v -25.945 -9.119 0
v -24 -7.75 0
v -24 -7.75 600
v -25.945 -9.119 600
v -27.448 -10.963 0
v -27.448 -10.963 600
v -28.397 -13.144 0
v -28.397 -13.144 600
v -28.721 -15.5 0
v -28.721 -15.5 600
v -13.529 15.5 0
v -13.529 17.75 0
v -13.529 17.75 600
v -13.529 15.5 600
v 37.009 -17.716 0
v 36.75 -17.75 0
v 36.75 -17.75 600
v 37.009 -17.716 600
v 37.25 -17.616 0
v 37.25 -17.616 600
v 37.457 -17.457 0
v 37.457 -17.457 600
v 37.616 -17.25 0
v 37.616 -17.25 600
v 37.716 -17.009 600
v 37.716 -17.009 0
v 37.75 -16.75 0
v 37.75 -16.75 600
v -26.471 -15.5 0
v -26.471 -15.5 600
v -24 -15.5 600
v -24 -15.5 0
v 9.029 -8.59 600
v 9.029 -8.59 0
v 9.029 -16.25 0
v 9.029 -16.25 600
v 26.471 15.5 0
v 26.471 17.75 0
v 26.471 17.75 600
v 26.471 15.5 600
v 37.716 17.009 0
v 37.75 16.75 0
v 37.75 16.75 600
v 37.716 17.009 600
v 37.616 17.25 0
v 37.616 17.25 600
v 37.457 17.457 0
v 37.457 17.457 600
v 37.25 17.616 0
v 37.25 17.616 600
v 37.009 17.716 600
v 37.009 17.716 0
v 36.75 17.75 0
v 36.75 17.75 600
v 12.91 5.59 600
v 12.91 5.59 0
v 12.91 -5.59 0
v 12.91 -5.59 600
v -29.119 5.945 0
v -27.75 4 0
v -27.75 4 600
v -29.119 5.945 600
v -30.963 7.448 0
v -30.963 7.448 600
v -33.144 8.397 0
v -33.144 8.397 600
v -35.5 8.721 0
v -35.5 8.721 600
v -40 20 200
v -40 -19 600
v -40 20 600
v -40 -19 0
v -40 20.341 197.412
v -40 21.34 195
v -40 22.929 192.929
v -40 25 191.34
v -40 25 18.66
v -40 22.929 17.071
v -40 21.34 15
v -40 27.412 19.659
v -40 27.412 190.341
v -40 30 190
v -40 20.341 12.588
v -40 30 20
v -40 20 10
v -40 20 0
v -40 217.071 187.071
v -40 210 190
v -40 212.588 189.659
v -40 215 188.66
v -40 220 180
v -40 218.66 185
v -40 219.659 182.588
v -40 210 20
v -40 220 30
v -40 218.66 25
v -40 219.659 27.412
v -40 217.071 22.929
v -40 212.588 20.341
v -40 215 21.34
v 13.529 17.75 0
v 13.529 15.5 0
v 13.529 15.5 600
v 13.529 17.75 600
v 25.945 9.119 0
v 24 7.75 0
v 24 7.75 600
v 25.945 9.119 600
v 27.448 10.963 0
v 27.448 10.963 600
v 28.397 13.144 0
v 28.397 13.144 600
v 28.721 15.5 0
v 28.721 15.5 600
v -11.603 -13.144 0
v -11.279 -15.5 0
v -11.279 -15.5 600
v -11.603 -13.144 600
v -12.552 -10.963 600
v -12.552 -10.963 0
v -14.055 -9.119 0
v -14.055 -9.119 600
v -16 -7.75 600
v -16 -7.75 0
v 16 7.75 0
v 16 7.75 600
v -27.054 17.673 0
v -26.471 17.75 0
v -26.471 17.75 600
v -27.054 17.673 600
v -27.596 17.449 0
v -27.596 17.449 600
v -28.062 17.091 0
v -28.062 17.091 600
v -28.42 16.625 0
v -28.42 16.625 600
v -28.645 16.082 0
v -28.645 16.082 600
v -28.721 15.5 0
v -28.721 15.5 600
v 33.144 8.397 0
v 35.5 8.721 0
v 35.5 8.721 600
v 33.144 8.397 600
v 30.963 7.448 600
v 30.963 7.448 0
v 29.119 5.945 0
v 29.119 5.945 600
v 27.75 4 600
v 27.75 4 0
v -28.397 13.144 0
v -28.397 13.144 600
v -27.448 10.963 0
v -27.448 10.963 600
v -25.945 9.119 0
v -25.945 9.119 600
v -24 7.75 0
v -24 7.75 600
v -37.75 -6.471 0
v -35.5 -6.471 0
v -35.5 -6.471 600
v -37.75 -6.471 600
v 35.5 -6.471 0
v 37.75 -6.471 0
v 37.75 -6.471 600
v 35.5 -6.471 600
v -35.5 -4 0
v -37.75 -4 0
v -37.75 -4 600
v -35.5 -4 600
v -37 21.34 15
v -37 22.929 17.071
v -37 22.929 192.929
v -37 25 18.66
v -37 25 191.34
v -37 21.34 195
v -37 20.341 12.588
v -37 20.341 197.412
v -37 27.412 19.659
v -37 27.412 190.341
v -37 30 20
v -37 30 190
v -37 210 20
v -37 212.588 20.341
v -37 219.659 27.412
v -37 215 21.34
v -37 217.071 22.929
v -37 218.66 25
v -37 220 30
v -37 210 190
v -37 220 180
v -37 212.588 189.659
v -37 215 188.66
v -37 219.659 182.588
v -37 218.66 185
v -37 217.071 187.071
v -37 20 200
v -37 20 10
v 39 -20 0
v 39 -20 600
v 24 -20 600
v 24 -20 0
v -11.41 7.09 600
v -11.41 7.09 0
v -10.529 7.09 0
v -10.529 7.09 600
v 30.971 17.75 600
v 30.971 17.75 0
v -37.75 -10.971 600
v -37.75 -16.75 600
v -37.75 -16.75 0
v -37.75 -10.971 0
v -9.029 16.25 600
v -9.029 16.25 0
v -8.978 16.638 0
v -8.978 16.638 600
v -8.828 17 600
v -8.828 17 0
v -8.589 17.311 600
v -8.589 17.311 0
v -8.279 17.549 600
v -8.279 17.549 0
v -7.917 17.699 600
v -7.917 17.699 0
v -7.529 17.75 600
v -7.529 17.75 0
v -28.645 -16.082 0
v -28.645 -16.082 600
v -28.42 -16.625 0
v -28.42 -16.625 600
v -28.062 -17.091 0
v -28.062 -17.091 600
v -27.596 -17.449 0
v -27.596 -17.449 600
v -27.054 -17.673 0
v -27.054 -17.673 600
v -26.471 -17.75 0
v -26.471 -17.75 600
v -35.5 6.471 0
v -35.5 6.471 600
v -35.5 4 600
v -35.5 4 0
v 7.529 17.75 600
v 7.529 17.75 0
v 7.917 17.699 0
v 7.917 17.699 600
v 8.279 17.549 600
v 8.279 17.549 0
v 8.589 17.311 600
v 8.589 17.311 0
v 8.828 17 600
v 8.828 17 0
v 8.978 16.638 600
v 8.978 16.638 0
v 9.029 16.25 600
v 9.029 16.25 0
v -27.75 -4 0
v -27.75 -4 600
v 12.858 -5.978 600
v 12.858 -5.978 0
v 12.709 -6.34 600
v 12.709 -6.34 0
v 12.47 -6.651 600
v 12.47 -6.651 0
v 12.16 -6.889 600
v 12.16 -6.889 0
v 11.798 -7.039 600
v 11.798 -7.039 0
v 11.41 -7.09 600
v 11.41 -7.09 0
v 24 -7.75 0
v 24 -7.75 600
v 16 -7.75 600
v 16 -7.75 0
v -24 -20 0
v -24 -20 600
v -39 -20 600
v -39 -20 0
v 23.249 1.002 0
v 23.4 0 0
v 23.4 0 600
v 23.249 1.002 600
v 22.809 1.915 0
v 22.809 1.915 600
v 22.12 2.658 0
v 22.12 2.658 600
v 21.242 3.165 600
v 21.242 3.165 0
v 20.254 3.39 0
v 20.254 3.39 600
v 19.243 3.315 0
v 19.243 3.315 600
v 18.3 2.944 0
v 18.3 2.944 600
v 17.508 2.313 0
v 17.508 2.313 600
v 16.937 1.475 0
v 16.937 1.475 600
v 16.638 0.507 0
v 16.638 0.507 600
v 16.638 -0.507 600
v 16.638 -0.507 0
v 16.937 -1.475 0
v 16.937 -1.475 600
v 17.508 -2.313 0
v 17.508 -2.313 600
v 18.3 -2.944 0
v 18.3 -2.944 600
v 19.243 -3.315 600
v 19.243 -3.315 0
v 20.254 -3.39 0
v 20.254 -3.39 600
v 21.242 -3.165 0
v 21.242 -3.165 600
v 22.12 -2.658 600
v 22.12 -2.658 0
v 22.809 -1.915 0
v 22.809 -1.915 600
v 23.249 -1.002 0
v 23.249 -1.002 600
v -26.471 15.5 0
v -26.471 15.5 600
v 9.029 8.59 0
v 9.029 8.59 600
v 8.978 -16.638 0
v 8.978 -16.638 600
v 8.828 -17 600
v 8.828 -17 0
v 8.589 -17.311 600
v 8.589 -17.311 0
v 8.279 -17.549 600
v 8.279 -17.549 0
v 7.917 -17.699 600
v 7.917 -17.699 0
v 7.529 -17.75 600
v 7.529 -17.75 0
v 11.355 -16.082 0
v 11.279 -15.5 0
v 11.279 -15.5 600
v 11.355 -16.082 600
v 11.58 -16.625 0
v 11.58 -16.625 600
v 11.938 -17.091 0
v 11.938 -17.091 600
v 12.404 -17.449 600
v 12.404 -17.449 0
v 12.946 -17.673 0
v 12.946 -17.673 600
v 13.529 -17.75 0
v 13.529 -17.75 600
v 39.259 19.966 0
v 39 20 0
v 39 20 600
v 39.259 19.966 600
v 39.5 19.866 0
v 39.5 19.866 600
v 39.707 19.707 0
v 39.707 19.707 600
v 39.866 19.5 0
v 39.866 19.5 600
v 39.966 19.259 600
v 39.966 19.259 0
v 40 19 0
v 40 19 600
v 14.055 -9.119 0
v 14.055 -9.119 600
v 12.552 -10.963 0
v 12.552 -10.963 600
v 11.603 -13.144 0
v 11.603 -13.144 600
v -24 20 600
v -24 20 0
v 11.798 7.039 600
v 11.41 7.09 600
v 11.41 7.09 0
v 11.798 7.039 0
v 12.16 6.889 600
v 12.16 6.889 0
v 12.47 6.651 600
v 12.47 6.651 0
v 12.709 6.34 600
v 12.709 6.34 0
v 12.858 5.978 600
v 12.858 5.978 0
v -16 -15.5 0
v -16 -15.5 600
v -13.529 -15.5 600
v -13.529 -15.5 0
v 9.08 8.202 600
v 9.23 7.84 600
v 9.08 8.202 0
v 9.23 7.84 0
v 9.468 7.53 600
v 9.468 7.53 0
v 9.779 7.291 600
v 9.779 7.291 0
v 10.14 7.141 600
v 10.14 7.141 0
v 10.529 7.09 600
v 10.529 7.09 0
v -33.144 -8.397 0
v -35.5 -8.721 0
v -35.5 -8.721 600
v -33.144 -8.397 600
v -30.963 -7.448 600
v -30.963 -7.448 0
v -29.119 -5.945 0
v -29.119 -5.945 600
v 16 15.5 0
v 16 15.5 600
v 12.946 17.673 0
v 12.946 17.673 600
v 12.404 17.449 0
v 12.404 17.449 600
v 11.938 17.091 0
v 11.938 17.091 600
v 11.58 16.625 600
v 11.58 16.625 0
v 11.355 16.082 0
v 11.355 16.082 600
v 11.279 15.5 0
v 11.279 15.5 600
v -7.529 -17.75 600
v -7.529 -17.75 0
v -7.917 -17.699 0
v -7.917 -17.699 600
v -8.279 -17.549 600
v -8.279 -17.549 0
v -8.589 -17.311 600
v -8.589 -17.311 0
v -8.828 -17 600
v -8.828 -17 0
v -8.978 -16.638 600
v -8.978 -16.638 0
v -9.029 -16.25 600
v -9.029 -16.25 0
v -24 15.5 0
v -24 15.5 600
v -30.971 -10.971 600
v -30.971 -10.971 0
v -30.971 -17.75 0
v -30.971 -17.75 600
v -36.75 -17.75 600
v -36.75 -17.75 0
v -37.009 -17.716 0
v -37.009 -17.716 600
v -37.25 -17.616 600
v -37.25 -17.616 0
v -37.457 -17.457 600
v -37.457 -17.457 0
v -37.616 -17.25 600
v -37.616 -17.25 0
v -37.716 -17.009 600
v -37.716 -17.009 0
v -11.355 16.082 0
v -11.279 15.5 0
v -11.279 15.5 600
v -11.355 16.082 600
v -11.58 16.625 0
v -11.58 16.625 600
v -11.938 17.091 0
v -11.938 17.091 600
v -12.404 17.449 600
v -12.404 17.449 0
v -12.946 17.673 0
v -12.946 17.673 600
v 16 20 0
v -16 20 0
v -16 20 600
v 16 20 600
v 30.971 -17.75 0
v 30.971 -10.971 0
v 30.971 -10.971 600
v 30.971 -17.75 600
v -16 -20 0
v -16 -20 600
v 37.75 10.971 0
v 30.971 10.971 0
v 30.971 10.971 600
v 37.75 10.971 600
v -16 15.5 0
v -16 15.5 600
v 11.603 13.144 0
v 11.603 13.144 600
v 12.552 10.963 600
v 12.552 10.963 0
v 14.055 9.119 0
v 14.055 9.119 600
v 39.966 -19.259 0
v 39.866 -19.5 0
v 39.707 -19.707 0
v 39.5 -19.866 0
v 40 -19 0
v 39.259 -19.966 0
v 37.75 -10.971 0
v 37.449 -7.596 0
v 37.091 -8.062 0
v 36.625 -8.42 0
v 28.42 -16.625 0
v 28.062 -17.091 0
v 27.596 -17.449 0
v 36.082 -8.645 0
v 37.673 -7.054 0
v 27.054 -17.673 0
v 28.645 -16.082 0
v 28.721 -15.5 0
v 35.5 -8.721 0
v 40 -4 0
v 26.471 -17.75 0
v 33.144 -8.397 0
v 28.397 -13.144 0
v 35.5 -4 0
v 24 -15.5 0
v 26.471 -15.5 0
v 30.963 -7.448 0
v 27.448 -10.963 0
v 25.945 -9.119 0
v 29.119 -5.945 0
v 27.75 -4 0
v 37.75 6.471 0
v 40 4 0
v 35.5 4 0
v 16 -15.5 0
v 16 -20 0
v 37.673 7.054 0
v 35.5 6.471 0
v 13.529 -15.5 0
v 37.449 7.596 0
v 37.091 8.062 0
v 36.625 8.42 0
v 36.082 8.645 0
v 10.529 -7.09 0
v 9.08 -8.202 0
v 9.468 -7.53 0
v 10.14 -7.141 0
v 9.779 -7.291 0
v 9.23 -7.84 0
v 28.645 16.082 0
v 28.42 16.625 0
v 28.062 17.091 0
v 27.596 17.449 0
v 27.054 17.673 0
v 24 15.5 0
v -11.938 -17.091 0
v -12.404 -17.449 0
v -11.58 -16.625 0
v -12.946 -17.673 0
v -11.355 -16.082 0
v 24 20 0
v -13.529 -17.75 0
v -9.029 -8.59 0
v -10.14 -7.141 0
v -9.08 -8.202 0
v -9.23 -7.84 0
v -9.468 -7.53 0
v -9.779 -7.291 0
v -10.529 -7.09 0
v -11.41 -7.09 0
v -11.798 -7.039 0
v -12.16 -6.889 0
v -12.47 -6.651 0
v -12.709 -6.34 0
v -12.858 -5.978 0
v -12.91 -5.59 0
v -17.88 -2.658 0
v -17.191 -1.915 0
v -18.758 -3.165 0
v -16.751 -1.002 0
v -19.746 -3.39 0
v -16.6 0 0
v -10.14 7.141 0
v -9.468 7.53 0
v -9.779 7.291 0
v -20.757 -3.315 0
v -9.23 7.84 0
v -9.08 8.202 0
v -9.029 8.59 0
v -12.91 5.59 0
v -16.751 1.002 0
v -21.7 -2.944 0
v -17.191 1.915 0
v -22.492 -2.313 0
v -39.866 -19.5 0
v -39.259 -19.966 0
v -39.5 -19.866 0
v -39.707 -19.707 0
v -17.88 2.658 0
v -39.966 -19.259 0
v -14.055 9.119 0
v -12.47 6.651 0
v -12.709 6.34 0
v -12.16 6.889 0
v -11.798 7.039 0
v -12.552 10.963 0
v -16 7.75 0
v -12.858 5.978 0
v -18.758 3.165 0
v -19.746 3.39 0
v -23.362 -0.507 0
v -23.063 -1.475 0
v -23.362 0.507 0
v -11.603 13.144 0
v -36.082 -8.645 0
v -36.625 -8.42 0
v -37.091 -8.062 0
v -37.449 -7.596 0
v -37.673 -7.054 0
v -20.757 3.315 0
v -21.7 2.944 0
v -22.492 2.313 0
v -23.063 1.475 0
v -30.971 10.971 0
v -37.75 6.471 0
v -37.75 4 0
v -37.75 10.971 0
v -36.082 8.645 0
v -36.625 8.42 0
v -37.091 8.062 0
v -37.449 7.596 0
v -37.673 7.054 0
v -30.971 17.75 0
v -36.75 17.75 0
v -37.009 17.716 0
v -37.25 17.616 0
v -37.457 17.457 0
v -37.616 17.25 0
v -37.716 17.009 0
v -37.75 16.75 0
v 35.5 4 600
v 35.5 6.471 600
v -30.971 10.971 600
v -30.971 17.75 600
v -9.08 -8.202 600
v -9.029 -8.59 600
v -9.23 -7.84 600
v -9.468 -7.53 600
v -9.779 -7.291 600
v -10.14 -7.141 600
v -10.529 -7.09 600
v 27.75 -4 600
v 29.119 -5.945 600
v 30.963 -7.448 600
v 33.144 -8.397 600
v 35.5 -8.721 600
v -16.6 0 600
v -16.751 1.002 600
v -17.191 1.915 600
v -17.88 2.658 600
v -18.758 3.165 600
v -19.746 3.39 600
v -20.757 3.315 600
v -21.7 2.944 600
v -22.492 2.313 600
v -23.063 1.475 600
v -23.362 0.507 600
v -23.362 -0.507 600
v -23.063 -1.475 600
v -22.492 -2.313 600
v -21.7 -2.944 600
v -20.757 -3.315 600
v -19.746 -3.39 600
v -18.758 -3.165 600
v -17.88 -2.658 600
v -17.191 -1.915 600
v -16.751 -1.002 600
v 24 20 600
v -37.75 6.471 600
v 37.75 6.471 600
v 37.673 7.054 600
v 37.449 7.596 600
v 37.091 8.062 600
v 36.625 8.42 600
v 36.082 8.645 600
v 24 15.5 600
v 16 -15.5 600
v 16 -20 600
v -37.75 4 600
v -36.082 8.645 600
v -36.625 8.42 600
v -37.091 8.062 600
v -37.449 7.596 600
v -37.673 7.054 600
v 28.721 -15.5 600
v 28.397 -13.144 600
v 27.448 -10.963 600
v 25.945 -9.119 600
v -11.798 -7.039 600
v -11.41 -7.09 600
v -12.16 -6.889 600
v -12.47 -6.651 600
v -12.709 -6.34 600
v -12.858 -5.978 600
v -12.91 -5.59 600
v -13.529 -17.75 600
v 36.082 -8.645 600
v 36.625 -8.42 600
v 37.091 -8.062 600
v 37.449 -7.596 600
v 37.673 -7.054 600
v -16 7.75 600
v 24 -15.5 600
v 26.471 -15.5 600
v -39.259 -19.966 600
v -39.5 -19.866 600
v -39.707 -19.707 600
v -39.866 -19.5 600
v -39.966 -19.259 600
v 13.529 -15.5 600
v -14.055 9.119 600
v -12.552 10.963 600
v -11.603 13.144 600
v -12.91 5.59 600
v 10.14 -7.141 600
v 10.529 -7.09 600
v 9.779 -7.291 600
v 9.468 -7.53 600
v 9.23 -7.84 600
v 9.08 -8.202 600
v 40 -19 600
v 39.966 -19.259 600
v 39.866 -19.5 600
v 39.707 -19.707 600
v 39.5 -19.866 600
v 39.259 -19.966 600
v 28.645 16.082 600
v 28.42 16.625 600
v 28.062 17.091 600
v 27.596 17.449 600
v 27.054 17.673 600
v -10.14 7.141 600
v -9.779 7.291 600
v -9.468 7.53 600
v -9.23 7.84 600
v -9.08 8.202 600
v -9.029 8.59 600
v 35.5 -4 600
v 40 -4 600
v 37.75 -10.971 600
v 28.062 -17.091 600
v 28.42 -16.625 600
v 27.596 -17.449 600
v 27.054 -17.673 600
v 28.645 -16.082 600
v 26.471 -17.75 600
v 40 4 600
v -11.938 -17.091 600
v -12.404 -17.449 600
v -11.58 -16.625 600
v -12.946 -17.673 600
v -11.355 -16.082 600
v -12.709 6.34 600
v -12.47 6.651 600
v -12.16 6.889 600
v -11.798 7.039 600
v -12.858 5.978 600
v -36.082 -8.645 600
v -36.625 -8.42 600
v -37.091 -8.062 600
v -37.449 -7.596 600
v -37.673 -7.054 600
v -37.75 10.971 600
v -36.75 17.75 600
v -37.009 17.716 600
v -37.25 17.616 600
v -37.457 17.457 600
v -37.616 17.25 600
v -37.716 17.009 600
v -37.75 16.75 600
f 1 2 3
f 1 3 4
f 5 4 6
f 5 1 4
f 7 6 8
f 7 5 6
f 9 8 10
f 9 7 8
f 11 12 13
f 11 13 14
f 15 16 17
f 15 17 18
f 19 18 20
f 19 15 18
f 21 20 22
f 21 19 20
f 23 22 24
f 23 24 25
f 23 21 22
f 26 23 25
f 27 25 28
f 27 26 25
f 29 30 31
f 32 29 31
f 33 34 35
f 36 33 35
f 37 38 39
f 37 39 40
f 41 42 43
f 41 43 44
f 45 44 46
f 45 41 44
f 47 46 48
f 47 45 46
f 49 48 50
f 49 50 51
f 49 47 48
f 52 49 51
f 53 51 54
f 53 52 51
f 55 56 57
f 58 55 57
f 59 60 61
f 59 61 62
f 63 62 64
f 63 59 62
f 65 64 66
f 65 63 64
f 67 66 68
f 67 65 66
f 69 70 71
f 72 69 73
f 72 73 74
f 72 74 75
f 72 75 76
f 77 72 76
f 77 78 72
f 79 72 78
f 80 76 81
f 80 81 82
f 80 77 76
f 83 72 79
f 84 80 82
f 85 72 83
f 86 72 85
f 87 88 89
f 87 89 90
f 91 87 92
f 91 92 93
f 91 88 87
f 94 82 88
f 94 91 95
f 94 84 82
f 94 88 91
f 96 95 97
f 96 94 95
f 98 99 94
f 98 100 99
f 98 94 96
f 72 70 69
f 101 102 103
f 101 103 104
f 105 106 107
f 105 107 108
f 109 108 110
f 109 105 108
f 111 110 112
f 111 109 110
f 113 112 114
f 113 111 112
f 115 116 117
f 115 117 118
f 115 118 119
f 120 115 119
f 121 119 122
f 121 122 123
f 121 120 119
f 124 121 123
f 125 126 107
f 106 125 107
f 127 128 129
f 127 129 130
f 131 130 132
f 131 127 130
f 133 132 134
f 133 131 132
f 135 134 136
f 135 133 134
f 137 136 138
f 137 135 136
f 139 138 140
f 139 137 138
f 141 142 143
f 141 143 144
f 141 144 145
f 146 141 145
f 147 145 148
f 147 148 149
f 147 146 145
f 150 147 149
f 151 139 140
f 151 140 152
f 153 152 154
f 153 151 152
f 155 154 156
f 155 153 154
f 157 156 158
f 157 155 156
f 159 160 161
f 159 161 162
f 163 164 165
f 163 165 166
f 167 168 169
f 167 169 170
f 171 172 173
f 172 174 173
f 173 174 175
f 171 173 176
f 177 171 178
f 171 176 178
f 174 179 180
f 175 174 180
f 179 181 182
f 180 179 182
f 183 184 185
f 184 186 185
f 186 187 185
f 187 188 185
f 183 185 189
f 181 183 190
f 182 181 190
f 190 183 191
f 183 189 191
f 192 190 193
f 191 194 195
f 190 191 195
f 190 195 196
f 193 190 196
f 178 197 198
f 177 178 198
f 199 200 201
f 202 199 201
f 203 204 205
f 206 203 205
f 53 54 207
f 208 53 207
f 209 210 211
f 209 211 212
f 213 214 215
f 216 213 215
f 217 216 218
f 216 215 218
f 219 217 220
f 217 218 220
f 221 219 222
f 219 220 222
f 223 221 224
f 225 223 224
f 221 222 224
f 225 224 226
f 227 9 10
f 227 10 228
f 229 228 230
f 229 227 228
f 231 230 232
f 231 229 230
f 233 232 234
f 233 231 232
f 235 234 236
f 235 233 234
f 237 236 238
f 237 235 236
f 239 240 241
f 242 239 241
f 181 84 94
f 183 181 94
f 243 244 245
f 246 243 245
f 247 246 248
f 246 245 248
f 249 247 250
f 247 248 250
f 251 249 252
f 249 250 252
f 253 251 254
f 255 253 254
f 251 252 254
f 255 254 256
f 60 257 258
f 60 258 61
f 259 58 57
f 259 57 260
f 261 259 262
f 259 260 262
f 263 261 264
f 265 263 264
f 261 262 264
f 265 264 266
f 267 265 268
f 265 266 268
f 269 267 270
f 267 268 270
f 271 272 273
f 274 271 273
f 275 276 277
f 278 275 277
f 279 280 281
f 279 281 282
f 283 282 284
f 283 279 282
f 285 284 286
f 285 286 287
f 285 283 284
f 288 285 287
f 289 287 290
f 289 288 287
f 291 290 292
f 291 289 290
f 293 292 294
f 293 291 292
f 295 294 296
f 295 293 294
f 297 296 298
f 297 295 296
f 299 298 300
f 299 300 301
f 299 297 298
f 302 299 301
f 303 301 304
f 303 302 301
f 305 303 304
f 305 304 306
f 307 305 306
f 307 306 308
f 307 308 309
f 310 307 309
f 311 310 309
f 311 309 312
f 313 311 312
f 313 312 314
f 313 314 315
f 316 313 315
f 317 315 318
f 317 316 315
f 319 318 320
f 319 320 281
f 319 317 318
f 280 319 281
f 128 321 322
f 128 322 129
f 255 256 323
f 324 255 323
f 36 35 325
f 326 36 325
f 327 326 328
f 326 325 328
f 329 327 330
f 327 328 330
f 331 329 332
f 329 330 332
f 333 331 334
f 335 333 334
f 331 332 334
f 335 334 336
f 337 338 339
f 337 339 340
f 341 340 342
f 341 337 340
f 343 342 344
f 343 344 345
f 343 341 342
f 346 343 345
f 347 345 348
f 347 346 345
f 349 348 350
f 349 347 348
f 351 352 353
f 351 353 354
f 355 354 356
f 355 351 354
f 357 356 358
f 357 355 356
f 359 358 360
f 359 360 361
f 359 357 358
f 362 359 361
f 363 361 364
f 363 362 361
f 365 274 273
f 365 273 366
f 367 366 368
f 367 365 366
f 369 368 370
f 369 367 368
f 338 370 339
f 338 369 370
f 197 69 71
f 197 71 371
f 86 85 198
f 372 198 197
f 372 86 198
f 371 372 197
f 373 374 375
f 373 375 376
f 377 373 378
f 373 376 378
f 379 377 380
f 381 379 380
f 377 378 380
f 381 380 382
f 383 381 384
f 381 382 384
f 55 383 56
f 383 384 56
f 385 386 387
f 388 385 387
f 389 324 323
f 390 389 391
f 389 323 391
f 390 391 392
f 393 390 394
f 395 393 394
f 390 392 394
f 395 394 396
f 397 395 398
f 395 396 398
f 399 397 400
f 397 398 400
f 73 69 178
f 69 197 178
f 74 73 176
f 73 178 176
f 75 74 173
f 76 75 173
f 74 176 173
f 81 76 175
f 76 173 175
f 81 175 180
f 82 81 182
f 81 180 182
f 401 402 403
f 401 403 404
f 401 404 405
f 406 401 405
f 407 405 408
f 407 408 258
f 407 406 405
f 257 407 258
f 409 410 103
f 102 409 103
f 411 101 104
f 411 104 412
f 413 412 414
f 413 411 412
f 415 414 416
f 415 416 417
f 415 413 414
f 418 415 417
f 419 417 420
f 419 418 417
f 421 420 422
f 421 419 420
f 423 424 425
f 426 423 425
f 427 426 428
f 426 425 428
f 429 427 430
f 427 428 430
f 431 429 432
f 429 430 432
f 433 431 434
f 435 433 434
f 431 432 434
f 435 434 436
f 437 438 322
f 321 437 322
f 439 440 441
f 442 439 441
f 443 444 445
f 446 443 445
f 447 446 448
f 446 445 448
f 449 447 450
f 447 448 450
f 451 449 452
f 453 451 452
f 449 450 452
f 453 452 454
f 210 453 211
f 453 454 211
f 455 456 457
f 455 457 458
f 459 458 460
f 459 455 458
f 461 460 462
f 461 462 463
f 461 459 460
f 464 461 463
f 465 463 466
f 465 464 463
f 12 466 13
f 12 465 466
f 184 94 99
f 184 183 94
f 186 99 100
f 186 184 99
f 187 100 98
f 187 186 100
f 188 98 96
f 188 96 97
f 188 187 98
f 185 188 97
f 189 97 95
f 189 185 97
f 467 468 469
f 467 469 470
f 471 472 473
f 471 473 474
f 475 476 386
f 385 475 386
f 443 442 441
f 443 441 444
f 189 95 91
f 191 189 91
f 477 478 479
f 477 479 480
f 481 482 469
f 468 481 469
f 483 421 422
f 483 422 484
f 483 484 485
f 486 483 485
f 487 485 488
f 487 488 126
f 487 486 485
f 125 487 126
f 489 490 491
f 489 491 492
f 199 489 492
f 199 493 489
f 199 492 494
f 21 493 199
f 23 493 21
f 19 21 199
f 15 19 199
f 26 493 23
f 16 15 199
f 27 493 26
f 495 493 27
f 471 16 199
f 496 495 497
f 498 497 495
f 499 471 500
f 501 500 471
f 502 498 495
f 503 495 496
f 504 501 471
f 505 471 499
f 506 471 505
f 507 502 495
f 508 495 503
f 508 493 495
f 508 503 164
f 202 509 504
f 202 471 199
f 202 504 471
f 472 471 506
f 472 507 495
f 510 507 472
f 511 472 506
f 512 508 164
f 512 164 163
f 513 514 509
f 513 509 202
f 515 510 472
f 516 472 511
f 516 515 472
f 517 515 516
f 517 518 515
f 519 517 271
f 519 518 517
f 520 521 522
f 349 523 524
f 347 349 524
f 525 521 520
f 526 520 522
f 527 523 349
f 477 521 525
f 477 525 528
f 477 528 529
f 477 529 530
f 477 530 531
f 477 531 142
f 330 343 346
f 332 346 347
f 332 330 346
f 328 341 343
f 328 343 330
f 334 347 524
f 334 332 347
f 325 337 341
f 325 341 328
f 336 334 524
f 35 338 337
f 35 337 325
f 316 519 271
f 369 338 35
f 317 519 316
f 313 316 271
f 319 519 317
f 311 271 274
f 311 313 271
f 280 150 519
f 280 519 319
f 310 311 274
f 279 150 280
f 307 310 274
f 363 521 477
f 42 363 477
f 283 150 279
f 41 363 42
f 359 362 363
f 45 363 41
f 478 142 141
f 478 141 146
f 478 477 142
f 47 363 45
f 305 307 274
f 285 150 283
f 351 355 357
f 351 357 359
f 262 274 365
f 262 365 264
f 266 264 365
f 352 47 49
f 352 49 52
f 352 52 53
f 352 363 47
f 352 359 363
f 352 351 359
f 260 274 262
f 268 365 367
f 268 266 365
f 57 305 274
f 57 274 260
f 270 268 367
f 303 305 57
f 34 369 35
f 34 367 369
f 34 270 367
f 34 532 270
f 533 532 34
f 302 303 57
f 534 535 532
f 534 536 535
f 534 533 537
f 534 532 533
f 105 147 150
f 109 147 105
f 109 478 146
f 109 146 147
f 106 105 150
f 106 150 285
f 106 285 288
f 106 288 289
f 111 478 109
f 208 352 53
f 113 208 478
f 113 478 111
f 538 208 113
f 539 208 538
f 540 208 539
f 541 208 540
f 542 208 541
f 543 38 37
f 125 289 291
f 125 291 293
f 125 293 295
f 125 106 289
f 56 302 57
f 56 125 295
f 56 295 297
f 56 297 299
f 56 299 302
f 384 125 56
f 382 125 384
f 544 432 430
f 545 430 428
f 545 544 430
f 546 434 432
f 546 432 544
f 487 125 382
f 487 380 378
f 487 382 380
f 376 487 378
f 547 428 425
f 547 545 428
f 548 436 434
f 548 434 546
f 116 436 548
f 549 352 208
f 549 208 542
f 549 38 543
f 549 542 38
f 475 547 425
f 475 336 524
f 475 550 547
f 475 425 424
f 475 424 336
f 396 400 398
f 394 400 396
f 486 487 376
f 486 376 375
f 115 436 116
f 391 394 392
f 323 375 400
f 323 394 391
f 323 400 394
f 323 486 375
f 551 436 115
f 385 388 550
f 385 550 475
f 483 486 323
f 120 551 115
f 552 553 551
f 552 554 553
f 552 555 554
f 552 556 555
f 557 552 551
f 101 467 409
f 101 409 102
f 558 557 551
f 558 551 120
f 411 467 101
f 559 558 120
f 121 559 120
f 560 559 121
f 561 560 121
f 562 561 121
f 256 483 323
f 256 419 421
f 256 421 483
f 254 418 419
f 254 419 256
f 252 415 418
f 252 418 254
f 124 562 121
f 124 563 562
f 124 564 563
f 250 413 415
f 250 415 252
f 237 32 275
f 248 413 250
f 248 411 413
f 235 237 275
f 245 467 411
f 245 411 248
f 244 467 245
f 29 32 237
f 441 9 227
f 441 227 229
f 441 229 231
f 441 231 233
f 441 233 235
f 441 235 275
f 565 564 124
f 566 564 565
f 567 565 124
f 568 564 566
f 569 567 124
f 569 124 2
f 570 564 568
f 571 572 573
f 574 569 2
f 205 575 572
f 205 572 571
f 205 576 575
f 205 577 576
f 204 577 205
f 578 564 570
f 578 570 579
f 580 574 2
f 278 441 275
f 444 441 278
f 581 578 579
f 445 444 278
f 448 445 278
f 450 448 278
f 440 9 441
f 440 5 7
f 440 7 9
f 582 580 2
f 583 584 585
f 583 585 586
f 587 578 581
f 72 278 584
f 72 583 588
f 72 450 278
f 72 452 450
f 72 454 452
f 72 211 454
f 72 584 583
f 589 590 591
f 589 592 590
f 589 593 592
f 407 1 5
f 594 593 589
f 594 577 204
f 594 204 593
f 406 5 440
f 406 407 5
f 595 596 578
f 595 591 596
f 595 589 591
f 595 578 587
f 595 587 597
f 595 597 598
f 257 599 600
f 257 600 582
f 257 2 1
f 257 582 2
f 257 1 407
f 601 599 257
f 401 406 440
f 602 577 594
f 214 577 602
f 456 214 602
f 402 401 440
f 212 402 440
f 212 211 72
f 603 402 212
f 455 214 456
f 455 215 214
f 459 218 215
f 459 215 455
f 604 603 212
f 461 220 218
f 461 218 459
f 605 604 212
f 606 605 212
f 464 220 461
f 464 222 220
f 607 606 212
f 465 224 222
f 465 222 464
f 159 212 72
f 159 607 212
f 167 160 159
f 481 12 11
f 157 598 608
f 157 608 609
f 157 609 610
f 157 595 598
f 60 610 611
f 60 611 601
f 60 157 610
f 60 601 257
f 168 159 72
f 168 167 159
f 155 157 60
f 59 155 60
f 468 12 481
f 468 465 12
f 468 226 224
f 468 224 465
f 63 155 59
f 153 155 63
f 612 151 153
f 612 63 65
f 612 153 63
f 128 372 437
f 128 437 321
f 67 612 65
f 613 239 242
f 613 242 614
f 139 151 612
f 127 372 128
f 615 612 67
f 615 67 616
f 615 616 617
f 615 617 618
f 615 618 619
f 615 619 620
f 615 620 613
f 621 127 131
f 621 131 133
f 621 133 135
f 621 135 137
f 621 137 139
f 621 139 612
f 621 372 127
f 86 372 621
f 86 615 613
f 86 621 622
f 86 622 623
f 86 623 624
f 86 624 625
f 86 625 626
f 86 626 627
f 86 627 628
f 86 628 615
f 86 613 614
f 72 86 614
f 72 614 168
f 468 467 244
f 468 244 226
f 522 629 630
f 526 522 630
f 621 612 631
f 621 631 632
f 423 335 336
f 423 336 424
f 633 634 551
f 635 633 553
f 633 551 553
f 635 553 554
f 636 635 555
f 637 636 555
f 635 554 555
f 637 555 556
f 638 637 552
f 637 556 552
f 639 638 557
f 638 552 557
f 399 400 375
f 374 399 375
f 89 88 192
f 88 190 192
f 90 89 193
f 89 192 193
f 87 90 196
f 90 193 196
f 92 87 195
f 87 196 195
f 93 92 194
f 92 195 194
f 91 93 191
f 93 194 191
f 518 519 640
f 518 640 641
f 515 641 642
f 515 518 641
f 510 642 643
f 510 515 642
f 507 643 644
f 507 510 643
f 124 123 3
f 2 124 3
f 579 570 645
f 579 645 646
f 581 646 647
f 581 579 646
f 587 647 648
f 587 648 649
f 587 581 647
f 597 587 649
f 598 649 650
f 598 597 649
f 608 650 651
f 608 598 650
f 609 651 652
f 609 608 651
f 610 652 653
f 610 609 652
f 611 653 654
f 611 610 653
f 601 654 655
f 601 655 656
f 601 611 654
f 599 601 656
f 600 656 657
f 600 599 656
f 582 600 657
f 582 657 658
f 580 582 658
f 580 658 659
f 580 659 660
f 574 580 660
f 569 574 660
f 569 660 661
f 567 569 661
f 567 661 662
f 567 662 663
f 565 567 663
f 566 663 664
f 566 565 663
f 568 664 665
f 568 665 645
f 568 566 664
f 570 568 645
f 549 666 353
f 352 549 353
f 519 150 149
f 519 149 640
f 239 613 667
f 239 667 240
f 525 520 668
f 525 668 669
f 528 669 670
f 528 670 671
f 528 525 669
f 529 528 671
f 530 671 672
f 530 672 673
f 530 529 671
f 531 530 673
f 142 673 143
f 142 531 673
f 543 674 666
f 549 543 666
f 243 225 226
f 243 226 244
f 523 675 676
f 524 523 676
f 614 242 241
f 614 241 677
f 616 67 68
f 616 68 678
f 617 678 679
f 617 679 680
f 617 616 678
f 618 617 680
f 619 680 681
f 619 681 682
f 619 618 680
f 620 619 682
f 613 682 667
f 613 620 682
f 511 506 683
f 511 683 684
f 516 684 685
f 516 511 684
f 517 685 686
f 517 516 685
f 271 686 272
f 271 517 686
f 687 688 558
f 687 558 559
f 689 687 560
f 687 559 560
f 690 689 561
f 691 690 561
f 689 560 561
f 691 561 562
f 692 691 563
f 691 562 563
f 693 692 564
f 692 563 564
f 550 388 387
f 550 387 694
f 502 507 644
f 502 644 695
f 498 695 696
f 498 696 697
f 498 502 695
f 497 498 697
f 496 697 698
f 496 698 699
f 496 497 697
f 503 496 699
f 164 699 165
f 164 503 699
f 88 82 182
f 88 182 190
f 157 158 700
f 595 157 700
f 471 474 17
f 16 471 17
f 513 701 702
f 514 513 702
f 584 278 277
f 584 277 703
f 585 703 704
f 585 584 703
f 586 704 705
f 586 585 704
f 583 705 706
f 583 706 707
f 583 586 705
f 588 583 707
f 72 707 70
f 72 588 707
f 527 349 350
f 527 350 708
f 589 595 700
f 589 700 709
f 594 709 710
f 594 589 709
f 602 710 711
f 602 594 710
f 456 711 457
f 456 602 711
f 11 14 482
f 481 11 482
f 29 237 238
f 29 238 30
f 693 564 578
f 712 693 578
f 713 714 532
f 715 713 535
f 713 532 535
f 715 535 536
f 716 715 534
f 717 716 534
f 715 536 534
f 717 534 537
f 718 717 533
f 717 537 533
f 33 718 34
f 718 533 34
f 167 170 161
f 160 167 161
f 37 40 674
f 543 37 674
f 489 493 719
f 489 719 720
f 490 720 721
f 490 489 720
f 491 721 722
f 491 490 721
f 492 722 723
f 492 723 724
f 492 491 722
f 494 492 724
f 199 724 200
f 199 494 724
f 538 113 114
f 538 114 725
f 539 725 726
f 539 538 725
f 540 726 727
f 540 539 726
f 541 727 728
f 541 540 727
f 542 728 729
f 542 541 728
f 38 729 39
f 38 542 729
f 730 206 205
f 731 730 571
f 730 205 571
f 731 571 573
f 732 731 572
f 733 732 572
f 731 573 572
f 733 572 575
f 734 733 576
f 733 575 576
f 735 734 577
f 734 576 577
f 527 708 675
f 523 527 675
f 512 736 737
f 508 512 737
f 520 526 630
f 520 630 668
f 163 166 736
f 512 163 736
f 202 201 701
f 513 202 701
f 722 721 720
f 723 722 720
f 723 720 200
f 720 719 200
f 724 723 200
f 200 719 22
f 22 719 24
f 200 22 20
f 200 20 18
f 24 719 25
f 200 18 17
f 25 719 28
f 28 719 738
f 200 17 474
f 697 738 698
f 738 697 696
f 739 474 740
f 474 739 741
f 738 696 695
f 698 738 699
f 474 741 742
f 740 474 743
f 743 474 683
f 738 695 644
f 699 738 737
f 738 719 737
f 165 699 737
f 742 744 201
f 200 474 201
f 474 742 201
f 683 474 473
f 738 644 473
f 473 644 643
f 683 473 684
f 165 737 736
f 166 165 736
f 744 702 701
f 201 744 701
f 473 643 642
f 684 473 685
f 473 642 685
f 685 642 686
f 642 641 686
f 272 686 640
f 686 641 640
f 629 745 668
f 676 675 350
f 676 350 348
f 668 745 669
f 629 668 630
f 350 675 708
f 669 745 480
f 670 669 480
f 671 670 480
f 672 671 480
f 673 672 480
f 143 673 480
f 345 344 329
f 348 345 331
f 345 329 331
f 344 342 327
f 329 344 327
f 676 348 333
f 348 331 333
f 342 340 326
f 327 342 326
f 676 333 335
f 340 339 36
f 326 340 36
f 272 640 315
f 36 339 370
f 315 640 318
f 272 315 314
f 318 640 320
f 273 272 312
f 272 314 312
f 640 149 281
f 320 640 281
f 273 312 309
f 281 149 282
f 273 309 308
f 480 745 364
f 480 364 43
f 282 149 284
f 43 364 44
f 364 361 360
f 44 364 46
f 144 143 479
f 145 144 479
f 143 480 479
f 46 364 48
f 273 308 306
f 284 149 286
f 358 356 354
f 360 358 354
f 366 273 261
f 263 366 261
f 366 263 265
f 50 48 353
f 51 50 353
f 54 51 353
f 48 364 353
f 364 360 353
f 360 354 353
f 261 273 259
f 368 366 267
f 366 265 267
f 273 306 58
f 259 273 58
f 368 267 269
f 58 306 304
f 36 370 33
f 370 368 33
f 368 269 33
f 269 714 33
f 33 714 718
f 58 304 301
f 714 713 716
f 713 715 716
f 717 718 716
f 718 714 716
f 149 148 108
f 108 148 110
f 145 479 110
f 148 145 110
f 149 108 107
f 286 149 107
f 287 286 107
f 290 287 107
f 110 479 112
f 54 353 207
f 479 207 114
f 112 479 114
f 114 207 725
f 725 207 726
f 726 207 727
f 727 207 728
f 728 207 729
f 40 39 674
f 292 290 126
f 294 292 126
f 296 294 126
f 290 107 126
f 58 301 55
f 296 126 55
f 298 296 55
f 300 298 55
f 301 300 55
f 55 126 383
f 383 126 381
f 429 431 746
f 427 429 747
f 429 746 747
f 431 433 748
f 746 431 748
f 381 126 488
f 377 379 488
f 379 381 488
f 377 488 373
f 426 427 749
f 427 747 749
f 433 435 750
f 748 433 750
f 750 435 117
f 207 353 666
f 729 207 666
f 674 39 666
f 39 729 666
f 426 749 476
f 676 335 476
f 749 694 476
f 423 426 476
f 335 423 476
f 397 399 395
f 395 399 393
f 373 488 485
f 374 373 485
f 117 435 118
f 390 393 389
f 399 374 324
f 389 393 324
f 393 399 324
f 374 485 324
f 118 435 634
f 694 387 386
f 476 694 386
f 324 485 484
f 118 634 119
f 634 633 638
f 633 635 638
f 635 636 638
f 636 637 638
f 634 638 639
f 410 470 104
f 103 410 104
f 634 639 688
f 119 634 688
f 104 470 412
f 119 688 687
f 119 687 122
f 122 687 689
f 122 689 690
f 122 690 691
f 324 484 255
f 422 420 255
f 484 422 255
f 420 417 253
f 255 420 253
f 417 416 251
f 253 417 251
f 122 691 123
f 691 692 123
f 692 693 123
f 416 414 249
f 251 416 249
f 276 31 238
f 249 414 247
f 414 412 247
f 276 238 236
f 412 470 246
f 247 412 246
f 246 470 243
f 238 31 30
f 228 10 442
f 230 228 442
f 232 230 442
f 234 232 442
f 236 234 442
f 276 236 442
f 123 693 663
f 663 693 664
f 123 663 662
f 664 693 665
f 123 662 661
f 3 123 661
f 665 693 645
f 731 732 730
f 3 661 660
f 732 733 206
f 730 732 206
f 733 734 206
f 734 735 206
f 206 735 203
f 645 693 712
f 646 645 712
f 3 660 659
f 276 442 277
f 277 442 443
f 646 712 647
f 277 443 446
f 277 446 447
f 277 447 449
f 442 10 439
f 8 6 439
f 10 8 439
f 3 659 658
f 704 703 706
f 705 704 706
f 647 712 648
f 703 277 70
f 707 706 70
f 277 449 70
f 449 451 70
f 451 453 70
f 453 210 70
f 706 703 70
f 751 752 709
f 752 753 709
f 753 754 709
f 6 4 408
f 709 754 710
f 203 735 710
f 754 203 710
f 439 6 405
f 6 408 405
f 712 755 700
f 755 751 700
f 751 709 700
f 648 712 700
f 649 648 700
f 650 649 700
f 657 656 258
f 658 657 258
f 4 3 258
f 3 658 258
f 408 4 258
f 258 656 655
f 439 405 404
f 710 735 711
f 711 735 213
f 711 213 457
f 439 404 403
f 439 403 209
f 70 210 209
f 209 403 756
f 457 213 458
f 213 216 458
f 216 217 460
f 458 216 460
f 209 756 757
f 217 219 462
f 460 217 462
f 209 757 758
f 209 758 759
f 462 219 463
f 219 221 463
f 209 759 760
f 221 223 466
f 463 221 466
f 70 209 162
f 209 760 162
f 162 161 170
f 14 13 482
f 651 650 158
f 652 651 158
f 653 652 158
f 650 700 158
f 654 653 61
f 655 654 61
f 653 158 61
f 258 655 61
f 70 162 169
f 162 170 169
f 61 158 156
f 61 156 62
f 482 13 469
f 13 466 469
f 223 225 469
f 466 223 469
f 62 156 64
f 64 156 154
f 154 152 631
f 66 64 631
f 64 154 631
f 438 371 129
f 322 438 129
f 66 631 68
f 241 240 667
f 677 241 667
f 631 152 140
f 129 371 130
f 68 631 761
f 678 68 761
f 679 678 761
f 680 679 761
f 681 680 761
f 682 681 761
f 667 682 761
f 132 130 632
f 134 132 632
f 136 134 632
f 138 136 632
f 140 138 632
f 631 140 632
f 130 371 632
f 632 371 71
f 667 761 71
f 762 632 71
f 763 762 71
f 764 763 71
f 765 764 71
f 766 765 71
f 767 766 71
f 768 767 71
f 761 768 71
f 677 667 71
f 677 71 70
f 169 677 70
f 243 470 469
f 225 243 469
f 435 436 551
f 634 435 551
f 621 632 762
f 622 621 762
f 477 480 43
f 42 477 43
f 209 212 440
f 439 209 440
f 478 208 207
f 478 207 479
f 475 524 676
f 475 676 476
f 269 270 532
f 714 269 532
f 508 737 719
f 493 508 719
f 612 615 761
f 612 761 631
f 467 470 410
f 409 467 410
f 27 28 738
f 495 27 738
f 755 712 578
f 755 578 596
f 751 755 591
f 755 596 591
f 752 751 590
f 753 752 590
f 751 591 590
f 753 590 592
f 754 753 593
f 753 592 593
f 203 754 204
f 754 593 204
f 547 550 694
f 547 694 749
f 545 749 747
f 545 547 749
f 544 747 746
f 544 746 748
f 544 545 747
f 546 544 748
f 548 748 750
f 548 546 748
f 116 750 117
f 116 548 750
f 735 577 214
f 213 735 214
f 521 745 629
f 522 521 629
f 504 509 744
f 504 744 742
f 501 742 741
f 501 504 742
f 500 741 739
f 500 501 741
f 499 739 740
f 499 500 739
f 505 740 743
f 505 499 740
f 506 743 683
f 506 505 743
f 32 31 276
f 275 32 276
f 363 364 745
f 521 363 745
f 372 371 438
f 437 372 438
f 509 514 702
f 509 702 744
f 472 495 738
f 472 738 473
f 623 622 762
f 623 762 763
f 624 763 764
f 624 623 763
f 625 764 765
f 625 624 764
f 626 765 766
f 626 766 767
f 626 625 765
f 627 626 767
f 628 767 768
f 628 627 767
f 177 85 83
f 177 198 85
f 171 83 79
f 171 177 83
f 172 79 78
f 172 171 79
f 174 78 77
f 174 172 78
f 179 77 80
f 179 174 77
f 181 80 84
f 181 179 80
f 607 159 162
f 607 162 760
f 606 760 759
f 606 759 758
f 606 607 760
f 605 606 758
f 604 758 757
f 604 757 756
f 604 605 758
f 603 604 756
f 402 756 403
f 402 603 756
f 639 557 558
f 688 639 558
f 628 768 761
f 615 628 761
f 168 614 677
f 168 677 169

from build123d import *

# Parameters (mm, degrees)
SZKIC1_R                    = 3.4
DODANIE_WYCI_GNI_CIE1_DEPTH = 600
SZKIC2_W                    = 170
SZKIC2_H                    = 200
DODANIE_WYCI_GNI_CIE3_DEPTH = 3
ZAOKR_GLENIE1_R             = 10


with BuildPart() as part:
    # Szkic1 → Dodanie-wyciągnięcie1 (new body)
    with BuildSketch(Plane.XY):
        with BuildLine():
            Line((-40, -19), (-40, 20))
            Line((-40, 20), (-24, 20))
            Line((-24, 20), (-24, 15.5))
            Line((-24, 15.5), (-26.471381771, 15.5))
            Line((-26.471381771, 15.5), (-26.471381771, 17.75))
            ThreePointArc((-26.471381771, 17.75), (-28.062372029, 17.090990258), (-28.721381771, 15.5))
            ThreePointArc((-28.721381771, 15.5), (-27.448087912, 10.962546258), (-24, 7.75))
            Line((-24, 7.75), (-16, 7.75))
            ThreePointArc((-16, 7.75), (-12.551912088, 10.962546258), (-11.278618229, 15.5))
            ThreePointArc((-11.278618229, 15.5), (-11.937627971, 17.090990258), (-13.528618229, 17.75))
            Line((-13.528618229, 17.75), (-13.528618229, 15.5))
            Line((-13.528618229, 15.5), (-16, 15.5))
            Line((-16, 15.5), (-16, 20))
            Line((-16, 20), (13.528618229, 20))
            Line((13.528618229, 20), (16, 20))
            Line((16, 20), (16, 15.5))
            Line((16, 15.5), (13.528618229, 15.5))
            Line((13.528618229, 15.5), (13.528618229, 17.75))
            ThreePointArc((13.528618229, 17.75), (11.937627971, 17.090990258), (11.278618229, 15.5))
            ThreePointArc((11.278618229, 15.5), (12.551912088, 10.962546258), (16, 7.75))
            Line((16, 7.75), (24, 7.75))
            ThreePointArc((24, 7.75), (27.448087912, 10.962546258), (28.721381771, 15.5))
            ThreePointArc((28.721381771, 15.5), (28.062372029, 17.090990258), (26.471381771, 17.75))
            Line((26.471381771, 17.75), (26.471381771, 15.5))
            Line((26.471381771, 15.5), (24, 15.5))
            Line((24, 15.5), (24, 20))
            Line((24, 20), (39, 20))
            ThreePointArc((39, 20), (39.707106781, 19.707106781), (40, 19))
            Line((40, 19), (40, 4))
            Line((40, 4), (35.5, 4))
            Line((35.5, 4), (35.5, 6.471381771))
            Line((35.5, 6.471381771), (37.75, 6.471381771))
            ThreePointArc((37.75, 6.471381771), (37.090990258, 8.062372029), (35.5, 8.721381771))
            ThreePointArc((35.5, 8.721381771), (30.962546258, 7.448087912), (27.75, 4))
            Line((27.75, 4), (27.75, -4))
            ThreePointArc((27.75, -4), (30.962546258, -7.448087912), (35.5, -8.721381771))
            ThreePointArc((35.5, -8.721381771), (37.090990258, -8.062372029), (37.75, -6.471381771))
            Line((37.75, -6.471381771), (35.5, -6.471381771))
            Line((35.5, -6.471381771), (35.5, -4))
            Line((35.5, -4), (40, -4))
            Line((40, -4), (40, -19))
            ThreePointArc((40, -19), (39.707106781, -19.707106781), (39, -20))
            Line((39, -20), (24, -20))
            Line((24, -20), (24, -15.5))
            Line((24, -15.5), (26.471381771, -15.5))
            Line((26.471381771, -15.5), (26.471381771, -17.75))
            ThreePointArc((26.471381771, -17.75), (28.062372029, -17.090990258), (28.721381771, -15.5))
            ThreePointArc((28.721381771, -15.5), (27.448087912, -10.962546258), (24, -7.75))
            Line((24, -7.75), (16, -7.75))
            ThreePointArc((16, -7.75), (12.551912088, -10.962546258), (11.278618229, -15.5))
            ThreePointArc((11.278618229, -15.5), (11.937627971, -17.090990258), (13.528618229, -17.75))
            Line((13.528618229, -17.75), (13.528618229, -15.5))
            Line((13.528618229, -15.5), (16, -15.5))
            Line((16, -15.5), (16, -20))
            Line((16, -20), (-16, -20))
            Line((-16, -20), (-16, -15.5))
            Line((-16, -15.5), (-13.528618229, -15.5))
            Line((-13.528618229, -15.5), (-13.528618229, -17.75))
            ThreePointArc((-13.528618229, -17.75), (-11.937627971, -17.090990258), (-11.278618229, -15.5))
            ThreePointArc((-11.278618229, -15.5), (-12.551912088, -10.962546258), (-16, -7.75))
            Line((-16, -7.75), (-24, -7.75))
            ThreePointArc((-24, -7.75), (-27.448087912, -10.962546258), (-28.721381771, -15.5))
            ThreePointArc((-28.721381771, -15.5), (-28.062372029, -17.090990258), (-26.471381771, -17.75))
            Line((-26.471381771, -17.75), (-26.471381771, -15.5))
            Line((-26.471381771, -15.5), (-24, -15.5))
            Line((-24, -15.5), (-24, -20))
            Line((-24, -20), (-39, -20))
            ThreePointArc((-39, -20), (-39.707106781, -19.707106781), (-40, -19))
        make_face()
        with Locations((-20, 0)):
            Circle(SZKIC1_R, mode=Mode.SUBTRACT)
        with Locations((20, 0)):
            Circle(SZKIC1_R, mode=Mode.SUBTRACT)
        with BuildLine():
            Line((30.971381771, -17.75), (36.75, -17.75))
            ThreePointArc((36.75, -17.75), (37.457106781, -17.457106781), (37.75, -16.75))
            Line((37.75, -16.75), (37.75, -10.971381771))
            Line((37.75, -10.971381771), (30.971381771, -10.971381771))
            Line((30.971381771, -10.971381771), (30.971381771, -17.75))
        make_face(mode=Mode.SUBTRACT)
        with BuildLine():
            Line((-35.5, -6.471381771), (-37.75, -6.471381771))
            ThreePointArc((-37.75, -6.471381771), (-37.090990258, -8.062372029), (-35.5, -8.721381771))
            ThreePointArc((-35.5, -8.721381771), (-30.962546258, -7.448087912), (-27.75, -4))
            Line((-27.75, -4), (-27.75, 4))
            ThreePointArc((-27.75, 4), (-30.962546258, 7.448087912), (-35.5, 8.721381771))
            ThreePointArc((-35.5, 8.721381771), (-37.090990258, 8.062372029), (-37.75, 6.471381771))
            Line((-37.75, 6.471381771), (-35.5, 6.471381771))
            Line((-35.5, 6.471381771), (-35.5, 4))
            Line((-35.5, 4), (-37.75, 4))
            Line((-37.75, 4), (-37.75, -4))
            Line((-37.75, -4), (-35.5, -4))
            Line((-35.5, -4), (-35.5, -6.471381771))
        make_face(mode=Mode.SUBTRACT)
        with BuildLine():
            Line((10.528618229, 7.090188806), (11.40950808, 7.090188806))
            ThreePointArc((11.40950808, 7.090188806), (12.470168251, 6.650848977), (12.90950808, 5.590188806))
            Line((12.90950808, 5.590188806), (12.90950808, -5.590188806))
            ThreePointArc((12.90950808, -5.590188806), (12.470168251, -6.650848977), (11.40950808, -7.090188806))
            Line((11.40950808, -7.090188806), (10.528618229, -7.090188806))
            ThreePointArc((10.528618229, -7.090188806), (9.467958057, -7.529528634), (9.028618229, -8.590188806))
            Line((9.028618229, -8.590188806), (9.028618229, -16.25))
            ThreePointArc((9.028618229, -16.25), (8.589278401, -17.310660172), (7.528618229, -17.75))
            Line((7.528618229, -17.75), (-7.528618229, -17.75))
            ThreePointArc((-7.528618229, -17.75), (-8.589278401, -17.310660172), (-9.028618229, -16.25))
            Line((-9.028618229, -16.25), (-9.028618229, -8.590188806))
            ThreePointArc((-9.028618229, -8.590188806), (-9.467958057, -7.529528634), (-10.528618229, -7.090188806))
            Line((-10.528618229, -7.090188806), (-11.40950808, -7.090188806))
            ThreePointArc((-11.40950808, -7.090188806), (-12.470168251, -6.650848977), (-12.90950808, -5.590188806))
            Line((-12.90950808, -5.590188806), (-12.90950808, 5.590188806))
            ThreePointArc((-12.90950808, 5.590188806), (-12.470168251, 6.650848977), (-11.40950808, 7.090188806))
            Line((-11.40950808, 7.090188806), (-10.528618229, 7.090188806))
            ThreePointArc((-10.528618229, 7.090188806), (-9.467958057, 7.529528634), (-9.028618229, 8.590188806))
            Line((-9.028618229, 8.590188806), (-9.028618229, 16.25))
            ThreePointArc((-9.028618229, 16.25), (-8.589278401, 17.310660172), (-7.528618229, 17.75))
            Line((-7.528618229, 17.75), (7.528618229, 17.75))
            ThreePointArc((7.528618229, 17.75), (8.589278401, 17.310660172), (9.028618229, 16.25))
            Line((9.028618229, 16.25), (9.028618229, 8.590188806))
            ThreePointArc((9.028618229, 8.590188806), (9.467958057, 7.529528634), (10.528618229, 7.090188806))
        make_face(mode=Mode.SUBTRACT)
        with BuildLine():
            Line((30.971381771, 10.971381771), (37.75, 10.971381771))
            Line((37.75, 10.971381771), (37.75, 16.75))
            ThreePointArc((37.75, 16.75), (37.457106781, 17.457106781), (36.75, 17.75))
            Line((36.75, 17.75), (30.971381771, 17.75))
            Line((30.971381771, 17.75), (30.971381771, 10.971381771))
        make_face(mode=Mode.SUBTRACT)
        with BuildLine():
            Line((-30.971381771, -10.971381771), (-30.971381771, -17.75))
            Line((-30.971381771, -17.75), (-36.75, -17.75))
            ThreePointArc((-36.75, -17.75), (-37.457106781, -17.457106781), (-37.75, -16.75))
            Line((-37.75, -16.75), (-37.75, -10.971381771))
            Line((-37.75, -10.971381771), (-30.971381771, -10.971381771))
        make_face(mode=Mode.SUBTRACT)
        with BuildLine():
            Line((-30.971381771, 17.75), (-36.75, 17.75))
            ThreePointArc((-36.75, 17.75), (-37.457106781, 17.457106781), (-37.75, 16.75))
            Line((-37.75, 16.75), (-37.75, 10.971381771))
            Line((-37.75, 10.971381771), (-30.971381771, 10.971381771))
            Line((-30.971381771, 10.971381771), (-30.971381771, 17.75))
        make_face(mode=Mode.SUBTRACT)
    extrude(amount=DODANIE_WYCI_GNI_CIE1_DEPTH)

    # Szkic2 → Dodanie-wyciągnięcie3 (add)
    with BuildSketch(Plane.ZY.offset(40)):
        with Locations((105, 120)):
            Rectangle(SZKIC2_W, SZKIC2_H)
    extrude(amount=-DODANIE_WYCI_GNI_CIE3_DEPTH)

    # Zaokrąglenie1
    zaokr_glenie1_edges = [part.edges().sort_by_distance(p)[0] for p in [
        (-38.5, 20, 20),
        (-38.5, 220, 20),
        (-38.5, 220, 190),
        (-38.5, 20, 190),
    ]]
    fillet(zaokr_glenie1_edges, radius=ZAOKR_GLENIE1_R)


solid = part.part
